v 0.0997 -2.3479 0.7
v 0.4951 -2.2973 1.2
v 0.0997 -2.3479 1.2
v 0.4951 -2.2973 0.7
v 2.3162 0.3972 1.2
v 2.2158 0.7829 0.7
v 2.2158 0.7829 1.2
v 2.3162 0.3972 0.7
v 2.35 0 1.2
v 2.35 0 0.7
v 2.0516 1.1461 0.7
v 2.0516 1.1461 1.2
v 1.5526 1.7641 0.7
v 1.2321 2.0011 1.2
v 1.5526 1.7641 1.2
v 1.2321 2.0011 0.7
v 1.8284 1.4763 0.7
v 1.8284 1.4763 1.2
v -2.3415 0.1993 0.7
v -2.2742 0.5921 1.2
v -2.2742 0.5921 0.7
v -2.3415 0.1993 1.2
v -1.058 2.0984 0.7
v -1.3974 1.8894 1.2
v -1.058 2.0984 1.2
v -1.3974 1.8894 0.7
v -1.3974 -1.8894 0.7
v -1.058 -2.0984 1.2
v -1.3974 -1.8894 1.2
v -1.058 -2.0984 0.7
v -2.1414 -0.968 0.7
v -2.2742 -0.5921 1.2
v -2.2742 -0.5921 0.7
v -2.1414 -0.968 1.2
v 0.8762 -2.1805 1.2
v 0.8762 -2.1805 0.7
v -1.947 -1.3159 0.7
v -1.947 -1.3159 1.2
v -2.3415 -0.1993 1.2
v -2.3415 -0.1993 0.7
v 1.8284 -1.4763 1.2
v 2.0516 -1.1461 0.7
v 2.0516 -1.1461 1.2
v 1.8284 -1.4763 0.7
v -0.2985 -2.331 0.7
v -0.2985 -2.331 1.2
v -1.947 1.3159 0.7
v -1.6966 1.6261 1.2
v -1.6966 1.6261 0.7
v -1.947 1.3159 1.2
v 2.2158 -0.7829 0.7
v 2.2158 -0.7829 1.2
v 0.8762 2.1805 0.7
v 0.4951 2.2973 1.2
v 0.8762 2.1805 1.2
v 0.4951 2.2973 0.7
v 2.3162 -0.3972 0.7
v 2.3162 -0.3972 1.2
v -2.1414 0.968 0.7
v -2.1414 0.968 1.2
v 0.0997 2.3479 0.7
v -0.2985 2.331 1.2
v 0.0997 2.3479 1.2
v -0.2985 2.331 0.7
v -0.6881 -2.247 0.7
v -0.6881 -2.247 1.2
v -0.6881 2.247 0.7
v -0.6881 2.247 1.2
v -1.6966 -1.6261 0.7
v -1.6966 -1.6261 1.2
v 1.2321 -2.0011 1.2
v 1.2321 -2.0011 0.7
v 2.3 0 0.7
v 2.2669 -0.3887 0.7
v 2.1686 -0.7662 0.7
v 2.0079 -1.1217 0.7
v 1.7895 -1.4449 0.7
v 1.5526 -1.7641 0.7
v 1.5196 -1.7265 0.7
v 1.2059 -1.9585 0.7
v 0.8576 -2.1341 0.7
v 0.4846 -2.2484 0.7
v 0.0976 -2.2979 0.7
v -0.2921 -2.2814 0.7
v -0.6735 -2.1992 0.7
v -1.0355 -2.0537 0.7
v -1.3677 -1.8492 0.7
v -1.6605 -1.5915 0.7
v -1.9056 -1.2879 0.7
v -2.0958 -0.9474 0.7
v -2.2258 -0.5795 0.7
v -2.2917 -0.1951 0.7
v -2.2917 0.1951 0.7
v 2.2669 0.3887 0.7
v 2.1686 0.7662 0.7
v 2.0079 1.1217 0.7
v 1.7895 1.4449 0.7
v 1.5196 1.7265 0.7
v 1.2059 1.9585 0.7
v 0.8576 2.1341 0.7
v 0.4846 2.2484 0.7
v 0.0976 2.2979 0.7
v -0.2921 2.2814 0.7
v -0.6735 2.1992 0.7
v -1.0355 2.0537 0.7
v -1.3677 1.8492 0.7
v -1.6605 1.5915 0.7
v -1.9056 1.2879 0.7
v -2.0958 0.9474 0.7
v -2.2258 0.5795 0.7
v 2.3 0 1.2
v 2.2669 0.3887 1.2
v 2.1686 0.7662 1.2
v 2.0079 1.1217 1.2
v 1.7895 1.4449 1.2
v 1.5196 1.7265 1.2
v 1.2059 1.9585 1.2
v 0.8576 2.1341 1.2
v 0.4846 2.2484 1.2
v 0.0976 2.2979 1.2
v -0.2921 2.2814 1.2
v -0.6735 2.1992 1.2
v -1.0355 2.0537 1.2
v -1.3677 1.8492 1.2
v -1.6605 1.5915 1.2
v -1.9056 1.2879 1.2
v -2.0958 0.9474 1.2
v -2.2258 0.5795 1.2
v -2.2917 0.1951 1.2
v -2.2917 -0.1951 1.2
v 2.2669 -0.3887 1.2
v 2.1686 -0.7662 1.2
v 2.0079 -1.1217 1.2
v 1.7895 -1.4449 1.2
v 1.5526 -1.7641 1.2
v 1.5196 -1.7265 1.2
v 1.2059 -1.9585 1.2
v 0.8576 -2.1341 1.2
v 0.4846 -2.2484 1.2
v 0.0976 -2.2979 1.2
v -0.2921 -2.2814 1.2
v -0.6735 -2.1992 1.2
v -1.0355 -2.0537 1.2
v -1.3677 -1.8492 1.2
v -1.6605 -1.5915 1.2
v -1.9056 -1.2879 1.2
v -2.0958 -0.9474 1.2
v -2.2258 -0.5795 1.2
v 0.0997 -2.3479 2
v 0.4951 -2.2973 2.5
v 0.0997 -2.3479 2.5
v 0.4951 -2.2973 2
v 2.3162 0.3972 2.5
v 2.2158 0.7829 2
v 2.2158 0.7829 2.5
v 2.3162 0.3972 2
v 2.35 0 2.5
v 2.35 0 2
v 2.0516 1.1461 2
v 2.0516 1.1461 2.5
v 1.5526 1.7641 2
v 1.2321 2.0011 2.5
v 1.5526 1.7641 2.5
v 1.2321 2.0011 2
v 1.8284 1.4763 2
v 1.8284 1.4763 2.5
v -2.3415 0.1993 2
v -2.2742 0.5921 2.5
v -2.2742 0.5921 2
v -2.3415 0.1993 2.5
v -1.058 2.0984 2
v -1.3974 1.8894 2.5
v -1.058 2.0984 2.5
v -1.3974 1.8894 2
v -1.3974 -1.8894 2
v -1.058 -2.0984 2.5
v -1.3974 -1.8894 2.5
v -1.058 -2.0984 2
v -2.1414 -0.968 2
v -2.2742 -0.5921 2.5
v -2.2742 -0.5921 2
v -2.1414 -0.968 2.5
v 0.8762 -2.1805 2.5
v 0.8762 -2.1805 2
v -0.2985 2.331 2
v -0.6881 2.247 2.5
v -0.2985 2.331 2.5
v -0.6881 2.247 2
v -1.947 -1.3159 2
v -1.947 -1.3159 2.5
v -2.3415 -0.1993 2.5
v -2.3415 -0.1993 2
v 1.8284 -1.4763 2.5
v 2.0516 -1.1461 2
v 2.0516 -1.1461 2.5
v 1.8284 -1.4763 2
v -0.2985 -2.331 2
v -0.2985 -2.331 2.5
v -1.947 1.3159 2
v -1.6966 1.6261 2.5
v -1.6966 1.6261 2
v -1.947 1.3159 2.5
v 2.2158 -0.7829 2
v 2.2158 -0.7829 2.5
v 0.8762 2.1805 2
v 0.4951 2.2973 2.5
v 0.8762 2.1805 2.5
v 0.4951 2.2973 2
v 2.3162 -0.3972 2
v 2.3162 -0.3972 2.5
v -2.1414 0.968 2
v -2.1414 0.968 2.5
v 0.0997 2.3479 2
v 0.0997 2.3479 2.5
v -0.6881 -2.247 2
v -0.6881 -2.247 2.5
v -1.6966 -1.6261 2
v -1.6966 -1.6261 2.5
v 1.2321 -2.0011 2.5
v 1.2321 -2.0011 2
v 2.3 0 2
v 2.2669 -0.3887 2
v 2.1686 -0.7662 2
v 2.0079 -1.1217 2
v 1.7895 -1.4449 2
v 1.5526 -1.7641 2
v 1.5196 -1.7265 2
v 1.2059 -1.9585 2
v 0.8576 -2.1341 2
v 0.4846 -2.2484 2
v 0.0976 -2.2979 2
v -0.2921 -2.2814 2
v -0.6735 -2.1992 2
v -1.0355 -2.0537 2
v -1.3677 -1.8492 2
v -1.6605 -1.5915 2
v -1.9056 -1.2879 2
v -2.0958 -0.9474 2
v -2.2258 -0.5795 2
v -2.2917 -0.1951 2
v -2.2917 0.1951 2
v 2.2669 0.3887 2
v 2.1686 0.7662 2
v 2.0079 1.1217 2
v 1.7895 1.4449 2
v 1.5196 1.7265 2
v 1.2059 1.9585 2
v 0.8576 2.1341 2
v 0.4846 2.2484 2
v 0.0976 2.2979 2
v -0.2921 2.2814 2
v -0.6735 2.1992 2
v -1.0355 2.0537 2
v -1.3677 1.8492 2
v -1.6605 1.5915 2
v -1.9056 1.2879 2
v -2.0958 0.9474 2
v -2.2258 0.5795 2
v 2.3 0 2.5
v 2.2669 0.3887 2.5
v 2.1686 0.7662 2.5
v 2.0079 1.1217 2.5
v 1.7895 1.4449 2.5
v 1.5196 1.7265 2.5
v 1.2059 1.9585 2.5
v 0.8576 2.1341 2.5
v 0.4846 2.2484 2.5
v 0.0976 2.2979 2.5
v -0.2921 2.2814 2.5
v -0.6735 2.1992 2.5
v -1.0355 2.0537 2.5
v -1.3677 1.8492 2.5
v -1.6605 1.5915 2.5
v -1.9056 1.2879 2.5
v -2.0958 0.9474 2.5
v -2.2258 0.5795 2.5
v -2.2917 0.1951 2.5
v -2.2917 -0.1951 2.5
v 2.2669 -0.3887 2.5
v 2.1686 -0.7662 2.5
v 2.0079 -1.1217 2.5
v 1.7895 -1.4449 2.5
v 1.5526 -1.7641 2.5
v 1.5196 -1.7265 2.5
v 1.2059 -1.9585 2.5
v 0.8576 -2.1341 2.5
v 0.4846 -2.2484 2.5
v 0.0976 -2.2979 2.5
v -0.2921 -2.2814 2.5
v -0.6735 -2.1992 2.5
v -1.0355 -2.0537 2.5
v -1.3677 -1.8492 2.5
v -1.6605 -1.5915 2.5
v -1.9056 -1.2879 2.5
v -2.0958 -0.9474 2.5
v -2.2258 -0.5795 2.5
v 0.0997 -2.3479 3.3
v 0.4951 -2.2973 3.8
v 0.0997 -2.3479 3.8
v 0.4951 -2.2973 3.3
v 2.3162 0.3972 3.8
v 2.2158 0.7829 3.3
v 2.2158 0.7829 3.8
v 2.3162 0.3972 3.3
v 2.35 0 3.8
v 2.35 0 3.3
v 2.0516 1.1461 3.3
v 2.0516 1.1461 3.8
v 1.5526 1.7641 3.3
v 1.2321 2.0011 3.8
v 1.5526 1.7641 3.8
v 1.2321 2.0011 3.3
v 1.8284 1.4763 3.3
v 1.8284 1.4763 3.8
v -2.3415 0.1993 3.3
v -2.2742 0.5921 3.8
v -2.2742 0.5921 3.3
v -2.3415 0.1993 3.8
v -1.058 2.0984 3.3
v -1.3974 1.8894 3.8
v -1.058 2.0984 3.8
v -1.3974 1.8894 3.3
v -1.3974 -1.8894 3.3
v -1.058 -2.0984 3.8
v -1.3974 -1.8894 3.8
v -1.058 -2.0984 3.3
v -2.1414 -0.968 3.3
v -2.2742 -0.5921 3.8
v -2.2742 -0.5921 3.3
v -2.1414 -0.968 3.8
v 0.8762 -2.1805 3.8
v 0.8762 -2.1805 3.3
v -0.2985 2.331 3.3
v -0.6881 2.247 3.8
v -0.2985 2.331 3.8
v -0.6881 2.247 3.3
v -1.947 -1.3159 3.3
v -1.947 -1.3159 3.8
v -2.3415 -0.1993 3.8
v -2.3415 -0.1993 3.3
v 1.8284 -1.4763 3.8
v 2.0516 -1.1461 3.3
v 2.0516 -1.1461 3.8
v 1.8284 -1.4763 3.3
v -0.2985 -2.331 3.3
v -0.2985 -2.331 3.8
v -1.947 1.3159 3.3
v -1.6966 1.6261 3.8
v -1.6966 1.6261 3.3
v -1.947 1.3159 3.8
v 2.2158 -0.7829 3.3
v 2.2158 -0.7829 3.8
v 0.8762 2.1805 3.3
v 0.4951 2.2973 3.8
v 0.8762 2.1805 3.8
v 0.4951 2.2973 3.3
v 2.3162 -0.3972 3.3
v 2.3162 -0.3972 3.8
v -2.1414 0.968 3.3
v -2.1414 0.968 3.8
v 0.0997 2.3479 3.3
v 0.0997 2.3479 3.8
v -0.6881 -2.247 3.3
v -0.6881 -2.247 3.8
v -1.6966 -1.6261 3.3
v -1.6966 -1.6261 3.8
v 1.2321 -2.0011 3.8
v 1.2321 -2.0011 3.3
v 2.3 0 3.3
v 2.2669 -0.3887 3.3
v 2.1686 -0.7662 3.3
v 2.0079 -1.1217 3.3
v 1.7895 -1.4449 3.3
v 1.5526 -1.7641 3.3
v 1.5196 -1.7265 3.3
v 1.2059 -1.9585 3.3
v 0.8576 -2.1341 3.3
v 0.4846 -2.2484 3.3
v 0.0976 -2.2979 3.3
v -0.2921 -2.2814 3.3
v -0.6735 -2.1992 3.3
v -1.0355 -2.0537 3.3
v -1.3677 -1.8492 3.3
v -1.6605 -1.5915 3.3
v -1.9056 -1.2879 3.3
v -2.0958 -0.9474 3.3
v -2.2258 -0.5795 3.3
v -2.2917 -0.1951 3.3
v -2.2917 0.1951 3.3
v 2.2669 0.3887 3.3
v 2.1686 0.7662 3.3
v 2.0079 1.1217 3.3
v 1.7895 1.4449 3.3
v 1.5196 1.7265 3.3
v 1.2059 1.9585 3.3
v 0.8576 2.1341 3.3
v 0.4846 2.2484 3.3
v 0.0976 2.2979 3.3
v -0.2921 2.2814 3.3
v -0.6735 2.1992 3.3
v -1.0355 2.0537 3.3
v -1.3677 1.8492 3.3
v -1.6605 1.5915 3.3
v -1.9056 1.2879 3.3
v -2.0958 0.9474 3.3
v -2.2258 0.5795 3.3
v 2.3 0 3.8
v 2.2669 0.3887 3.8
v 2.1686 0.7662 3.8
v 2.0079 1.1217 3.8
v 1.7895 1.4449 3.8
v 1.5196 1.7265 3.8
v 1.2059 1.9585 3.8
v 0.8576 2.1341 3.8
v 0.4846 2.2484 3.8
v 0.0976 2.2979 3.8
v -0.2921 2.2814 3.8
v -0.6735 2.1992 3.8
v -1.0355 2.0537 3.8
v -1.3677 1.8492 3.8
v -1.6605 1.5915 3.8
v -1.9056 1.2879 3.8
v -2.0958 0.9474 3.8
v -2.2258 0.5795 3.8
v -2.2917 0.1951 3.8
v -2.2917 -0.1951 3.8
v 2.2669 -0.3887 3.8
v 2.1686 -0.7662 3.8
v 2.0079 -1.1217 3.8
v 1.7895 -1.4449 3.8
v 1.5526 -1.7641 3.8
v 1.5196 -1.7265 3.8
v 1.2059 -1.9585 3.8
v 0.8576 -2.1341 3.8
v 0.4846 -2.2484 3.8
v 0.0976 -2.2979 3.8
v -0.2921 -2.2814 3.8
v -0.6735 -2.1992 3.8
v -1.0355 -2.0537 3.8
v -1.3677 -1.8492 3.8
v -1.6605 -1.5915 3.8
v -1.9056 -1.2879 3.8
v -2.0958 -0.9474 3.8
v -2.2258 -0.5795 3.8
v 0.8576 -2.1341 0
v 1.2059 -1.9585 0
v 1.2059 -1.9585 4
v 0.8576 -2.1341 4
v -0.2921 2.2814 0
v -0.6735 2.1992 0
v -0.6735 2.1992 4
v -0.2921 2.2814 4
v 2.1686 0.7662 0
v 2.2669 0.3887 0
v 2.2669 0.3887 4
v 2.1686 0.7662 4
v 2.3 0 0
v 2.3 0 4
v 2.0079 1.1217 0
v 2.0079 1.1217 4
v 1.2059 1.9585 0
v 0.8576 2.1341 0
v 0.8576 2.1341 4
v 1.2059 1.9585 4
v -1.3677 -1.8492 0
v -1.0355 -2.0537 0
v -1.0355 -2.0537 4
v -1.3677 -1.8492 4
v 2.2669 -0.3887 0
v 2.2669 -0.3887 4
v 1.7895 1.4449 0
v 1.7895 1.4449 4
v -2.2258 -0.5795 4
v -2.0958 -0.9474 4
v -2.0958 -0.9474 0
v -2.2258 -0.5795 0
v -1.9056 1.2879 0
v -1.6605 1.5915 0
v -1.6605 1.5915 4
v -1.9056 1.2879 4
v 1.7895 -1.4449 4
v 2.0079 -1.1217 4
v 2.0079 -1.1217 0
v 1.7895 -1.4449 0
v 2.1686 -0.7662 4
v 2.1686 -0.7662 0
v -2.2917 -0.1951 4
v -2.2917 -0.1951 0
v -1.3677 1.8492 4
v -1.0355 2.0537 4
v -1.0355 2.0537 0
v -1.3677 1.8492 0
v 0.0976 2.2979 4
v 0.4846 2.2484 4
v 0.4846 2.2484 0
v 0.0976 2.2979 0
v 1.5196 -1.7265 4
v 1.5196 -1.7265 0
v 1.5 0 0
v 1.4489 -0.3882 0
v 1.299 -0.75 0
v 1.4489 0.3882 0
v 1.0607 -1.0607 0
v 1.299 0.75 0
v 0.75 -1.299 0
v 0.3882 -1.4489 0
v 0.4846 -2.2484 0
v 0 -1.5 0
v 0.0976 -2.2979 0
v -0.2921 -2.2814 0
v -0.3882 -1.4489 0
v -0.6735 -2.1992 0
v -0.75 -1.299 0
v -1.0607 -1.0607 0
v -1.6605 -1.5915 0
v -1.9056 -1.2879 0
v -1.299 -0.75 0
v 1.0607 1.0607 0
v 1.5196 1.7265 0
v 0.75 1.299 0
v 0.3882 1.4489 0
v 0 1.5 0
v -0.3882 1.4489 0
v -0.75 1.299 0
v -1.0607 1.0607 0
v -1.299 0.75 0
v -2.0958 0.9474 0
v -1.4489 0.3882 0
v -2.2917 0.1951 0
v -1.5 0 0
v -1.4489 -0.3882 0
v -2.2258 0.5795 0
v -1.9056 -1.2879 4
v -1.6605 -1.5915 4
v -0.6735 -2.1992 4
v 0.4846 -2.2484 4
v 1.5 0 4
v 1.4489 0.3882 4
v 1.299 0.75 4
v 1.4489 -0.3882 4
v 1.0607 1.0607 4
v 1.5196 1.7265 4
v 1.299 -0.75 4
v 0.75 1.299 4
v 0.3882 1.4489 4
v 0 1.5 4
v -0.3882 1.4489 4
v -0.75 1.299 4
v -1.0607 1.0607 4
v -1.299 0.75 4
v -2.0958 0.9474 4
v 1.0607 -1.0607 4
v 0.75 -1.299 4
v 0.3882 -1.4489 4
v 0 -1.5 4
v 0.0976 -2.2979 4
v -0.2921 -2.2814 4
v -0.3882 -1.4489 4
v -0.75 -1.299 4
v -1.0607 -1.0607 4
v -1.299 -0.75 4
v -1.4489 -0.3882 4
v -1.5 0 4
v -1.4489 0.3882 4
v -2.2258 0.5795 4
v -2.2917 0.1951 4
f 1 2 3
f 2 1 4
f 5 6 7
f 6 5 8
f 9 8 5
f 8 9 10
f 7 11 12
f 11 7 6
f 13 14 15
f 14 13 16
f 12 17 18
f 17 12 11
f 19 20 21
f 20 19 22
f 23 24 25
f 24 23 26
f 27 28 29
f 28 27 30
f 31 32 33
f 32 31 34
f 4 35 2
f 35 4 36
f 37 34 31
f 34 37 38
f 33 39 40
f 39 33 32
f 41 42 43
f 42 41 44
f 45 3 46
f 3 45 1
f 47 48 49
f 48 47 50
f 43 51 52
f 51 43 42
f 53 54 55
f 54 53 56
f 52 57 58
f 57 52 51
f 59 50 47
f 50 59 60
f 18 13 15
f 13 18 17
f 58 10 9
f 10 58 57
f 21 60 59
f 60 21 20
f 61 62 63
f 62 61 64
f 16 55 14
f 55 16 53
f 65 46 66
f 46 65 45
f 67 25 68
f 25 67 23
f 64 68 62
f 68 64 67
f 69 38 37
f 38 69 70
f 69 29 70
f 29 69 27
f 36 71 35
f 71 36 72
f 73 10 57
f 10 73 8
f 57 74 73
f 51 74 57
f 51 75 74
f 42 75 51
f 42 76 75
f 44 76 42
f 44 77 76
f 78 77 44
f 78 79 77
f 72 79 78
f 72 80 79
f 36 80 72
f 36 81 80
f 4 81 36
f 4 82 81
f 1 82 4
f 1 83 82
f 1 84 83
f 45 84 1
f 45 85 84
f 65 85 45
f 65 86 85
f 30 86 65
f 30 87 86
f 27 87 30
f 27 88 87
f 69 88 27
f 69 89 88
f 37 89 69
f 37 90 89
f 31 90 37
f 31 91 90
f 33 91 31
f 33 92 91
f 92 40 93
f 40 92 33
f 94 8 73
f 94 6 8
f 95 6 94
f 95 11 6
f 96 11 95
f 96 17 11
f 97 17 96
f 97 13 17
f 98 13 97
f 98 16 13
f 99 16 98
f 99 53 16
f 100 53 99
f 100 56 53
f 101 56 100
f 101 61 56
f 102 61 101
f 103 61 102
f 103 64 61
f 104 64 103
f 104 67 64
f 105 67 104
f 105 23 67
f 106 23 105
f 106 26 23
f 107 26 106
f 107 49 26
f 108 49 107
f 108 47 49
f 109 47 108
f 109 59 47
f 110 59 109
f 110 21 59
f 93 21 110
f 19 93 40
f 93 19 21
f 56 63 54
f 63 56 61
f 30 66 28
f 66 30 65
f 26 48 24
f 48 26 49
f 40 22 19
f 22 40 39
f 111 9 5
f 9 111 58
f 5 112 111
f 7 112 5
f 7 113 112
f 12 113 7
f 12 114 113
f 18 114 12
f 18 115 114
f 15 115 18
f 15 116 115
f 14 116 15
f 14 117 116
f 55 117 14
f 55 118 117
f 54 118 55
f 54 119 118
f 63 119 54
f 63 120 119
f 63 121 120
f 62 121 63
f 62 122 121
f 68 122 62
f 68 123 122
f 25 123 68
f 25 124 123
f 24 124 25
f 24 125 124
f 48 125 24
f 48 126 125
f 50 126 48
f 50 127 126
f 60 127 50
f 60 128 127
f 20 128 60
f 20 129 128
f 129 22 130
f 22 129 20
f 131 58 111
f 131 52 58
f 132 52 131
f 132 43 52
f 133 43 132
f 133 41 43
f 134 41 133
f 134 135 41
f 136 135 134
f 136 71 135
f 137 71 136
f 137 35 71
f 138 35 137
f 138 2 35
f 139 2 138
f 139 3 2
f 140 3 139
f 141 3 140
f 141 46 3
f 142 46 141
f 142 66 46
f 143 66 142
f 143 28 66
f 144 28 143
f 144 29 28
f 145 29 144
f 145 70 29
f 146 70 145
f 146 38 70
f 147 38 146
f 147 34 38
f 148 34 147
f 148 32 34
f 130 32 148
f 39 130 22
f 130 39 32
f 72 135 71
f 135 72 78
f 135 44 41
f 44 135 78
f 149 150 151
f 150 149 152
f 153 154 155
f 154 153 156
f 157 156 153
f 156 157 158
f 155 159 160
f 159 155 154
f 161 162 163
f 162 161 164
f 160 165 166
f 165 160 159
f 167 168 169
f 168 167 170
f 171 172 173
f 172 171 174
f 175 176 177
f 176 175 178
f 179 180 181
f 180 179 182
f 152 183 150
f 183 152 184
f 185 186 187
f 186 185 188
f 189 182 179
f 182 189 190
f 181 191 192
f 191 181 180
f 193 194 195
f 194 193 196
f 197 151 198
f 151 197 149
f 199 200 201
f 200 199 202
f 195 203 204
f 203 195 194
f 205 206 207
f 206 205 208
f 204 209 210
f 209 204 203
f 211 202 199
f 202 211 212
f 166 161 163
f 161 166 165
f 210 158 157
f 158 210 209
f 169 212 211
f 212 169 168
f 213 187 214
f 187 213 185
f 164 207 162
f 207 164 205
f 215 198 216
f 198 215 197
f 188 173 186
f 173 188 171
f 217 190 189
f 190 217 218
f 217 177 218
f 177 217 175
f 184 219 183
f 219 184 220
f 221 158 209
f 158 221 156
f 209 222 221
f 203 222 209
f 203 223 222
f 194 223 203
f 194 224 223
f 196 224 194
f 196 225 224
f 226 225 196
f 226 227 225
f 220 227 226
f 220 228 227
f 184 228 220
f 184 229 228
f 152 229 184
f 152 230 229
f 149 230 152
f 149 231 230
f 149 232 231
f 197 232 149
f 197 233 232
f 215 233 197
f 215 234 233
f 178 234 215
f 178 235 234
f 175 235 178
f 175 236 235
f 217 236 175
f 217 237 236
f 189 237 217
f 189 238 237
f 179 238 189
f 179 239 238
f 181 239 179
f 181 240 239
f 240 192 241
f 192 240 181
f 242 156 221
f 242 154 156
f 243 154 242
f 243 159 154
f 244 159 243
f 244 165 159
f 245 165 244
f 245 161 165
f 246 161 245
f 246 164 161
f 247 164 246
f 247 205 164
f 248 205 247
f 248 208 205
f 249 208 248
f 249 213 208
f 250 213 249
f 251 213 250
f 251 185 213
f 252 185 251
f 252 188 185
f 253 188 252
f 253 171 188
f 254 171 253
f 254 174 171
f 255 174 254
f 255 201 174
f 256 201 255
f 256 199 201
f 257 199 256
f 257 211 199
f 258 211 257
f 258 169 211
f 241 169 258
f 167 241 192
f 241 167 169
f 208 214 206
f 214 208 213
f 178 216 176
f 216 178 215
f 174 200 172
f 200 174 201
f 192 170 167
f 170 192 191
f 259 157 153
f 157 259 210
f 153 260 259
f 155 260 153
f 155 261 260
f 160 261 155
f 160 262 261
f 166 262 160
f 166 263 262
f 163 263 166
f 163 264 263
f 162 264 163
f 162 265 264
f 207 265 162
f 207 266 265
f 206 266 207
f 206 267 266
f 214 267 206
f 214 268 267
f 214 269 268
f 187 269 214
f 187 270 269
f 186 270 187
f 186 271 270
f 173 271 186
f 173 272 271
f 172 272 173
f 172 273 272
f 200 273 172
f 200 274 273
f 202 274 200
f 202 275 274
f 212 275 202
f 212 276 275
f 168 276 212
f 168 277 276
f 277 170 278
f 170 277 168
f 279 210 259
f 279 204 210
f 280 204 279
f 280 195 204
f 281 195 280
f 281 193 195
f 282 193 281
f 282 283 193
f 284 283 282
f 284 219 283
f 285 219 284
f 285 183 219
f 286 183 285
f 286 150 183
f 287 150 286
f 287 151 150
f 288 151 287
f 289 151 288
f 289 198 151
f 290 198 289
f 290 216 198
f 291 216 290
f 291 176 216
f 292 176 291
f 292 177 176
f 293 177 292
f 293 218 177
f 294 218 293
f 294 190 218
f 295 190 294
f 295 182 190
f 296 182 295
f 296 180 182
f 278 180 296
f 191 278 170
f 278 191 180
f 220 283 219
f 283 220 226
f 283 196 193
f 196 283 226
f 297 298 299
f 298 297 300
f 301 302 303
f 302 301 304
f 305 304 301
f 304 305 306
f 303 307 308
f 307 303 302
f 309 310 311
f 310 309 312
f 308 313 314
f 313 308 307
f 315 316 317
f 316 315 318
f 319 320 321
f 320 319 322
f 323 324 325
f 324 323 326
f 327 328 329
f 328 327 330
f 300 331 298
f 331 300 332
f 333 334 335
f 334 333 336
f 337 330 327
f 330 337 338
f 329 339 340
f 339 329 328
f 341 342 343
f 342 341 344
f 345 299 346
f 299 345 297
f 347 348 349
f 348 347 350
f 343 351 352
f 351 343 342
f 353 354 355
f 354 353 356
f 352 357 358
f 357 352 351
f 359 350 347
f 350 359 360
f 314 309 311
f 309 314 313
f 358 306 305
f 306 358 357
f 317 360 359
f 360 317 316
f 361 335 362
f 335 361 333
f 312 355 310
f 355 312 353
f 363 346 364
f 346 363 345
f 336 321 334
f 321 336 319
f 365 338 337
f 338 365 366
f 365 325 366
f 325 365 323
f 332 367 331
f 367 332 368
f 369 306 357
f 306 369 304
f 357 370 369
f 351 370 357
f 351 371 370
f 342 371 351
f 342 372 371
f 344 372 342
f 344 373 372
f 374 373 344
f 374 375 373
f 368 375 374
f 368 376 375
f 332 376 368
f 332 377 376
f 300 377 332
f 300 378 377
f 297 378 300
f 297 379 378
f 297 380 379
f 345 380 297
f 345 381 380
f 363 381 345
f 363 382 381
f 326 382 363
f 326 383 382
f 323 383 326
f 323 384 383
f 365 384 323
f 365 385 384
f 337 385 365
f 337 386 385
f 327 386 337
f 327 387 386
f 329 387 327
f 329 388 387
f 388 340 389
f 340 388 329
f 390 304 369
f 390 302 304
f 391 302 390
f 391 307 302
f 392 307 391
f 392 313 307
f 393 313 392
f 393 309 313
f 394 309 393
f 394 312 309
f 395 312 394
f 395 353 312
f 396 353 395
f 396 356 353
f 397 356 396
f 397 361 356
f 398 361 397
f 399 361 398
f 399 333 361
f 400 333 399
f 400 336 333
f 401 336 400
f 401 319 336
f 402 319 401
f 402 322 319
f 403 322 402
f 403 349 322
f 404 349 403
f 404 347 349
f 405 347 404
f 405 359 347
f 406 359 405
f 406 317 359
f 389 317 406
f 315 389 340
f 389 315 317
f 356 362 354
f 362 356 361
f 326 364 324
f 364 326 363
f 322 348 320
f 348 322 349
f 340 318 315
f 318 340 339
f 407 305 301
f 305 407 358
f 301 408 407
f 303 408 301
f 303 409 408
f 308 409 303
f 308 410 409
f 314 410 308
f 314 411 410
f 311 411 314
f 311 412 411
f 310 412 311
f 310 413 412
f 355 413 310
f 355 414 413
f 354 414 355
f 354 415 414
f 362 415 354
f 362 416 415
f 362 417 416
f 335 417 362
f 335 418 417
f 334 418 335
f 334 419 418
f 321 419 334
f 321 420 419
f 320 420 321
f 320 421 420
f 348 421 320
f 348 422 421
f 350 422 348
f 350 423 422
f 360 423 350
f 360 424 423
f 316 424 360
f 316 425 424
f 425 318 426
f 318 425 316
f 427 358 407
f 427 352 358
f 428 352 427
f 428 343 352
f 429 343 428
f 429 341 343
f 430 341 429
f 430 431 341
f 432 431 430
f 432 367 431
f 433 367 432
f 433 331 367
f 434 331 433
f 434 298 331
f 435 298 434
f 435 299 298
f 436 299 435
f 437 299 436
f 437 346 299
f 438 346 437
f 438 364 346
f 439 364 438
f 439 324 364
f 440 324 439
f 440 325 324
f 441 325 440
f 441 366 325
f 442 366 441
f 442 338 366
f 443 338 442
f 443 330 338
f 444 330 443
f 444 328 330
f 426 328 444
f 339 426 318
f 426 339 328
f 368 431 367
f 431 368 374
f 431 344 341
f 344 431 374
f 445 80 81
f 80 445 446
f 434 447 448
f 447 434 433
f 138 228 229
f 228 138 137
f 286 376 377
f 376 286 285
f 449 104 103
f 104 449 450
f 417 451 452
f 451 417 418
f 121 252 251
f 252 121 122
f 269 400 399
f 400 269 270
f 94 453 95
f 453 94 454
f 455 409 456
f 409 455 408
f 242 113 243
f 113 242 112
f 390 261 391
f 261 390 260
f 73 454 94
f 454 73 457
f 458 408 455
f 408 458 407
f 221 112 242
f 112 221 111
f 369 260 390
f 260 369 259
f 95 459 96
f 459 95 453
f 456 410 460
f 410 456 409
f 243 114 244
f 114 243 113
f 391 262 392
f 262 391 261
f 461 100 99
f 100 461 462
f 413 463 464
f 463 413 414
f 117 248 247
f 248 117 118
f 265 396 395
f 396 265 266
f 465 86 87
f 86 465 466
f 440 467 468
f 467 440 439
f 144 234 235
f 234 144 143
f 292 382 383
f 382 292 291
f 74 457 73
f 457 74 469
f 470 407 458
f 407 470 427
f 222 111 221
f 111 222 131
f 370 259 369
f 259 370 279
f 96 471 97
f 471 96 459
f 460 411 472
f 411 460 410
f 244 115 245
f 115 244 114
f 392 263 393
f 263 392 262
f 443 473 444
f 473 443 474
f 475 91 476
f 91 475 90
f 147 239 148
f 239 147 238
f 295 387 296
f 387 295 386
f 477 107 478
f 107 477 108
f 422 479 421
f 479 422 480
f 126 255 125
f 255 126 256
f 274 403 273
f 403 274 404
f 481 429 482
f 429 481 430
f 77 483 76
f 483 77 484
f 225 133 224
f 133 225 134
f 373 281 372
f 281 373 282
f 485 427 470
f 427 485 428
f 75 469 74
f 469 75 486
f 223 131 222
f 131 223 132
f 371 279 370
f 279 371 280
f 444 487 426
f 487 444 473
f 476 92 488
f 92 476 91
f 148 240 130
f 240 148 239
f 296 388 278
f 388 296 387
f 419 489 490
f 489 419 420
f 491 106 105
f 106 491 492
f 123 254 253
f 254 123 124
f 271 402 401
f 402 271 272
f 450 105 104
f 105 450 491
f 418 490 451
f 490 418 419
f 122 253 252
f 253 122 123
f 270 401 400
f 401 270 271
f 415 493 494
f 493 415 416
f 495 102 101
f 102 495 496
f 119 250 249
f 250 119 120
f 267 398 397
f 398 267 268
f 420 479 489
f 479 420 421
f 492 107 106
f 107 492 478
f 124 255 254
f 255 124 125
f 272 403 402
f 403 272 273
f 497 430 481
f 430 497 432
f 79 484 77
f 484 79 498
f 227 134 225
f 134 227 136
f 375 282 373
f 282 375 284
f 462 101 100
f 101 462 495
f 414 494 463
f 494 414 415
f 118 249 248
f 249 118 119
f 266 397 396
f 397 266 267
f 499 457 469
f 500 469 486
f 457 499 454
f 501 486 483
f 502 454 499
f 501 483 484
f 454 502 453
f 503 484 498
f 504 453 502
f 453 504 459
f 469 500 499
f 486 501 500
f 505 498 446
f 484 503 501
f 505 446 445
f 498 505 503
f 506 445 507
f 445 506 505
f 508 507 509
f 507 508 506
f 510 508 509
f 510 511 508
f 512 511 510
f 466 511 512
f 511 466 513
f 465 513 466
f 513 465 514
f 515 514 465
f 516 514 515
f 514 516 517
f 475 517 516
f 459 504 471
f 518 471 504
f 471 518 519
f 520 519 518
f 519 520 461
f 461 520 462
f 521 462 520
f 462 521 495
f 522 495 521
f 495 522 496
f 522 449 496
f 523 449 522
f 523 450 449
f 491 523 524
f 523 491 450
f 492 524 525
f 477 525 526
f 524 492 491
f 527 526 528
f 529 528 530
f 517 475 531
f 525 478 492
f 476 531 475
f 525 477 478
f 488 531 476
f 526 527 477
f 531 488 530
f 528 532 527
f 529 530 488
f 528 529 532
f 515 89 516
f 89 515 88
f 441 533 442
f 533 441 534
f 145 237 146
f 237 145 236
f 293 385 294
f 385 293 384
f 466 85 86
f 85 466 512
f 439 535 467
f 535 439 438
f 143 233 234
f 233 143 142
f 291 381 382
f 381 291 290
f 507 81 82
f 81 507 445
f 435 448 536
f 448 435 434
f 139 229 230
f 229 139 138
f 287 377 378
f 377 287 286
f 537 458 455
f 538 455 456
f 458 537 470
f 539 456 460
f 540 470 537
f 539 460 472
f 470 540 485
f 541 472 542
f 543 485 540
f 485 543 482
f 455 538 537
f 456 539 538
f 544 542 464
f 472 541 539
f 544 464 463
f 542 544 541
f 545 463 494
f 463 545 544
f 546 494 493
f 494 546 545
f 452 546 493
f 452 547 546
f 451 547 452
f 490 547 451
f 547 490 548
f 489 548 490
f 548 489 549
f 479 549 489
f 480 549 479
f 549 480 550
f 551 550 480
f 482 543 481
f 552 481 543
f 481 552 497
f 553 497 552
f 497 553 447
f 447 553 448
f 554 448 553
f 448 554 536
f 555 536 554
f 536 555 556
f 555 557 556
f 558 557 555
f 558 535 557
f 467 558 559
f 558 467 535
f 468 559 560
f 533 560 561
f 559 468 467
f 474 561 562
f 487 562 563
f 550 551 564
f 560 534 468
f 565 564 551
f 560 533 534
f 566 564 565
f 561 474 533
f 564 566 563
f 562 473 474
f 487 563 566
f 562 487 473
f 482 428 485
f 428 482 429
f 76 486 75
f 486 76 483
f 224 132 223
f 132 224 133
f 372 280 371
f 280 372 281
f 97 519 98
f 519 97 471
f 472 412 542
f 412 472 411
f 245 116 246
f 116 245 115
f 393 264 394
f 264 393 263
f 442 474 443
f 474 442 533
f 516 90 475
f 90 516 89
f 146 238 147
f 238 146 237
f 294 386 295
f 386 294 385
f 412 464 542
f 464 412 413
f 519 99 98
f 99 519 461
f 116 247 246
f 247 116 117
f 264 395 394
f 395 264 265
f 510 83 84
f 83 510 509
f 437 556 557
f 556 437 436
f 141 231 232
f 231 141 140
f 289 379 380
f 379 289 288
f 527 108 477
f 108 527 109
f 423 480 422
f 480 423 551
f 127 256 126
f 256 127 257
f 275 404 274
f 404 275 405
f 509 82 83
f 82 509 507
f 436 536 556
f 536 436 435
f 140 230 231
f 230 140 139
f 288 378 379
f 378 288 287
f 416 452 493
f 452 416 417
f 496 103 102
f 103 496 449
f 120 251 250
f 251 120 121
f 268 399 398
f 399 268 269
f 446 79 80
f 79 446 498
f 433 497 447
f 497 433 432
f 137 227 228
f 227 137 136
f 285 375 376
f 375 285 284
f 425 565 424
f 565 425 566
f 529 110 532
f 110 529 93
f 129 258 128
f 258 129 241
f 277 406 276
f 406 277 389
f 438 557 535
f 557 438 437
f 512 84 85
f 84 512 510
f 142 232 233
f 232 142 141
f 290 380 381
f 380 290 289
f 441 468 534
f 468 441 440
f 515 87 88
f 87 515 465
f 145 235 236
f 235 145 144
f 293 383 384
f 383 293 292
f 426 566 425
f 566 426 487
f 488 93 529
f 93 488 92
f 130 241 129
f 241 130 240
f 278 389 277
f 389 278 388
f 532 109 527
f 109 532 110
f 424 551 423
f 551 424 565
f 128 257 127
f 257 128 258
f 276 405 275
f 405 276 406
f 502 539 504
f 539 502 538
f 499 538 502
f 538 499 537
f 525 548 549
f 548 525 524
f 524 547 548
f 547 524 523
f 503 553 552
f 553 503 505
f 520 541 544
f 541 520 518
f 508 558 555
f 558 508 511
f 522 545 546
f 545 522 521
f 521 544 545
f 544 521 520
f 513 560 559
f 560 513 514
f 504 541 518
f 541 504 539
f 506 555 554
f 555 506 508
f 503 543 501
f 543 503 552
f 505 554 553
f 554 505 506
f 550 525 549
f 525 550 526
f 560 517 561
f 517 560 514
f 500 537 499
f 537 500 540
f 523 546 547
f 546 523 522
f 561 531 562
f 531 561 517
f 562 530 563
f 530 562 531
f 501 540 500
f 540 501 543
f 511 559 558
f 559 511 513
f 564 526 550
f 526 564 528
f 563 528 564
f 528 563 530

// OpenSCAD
$fa = 2;
$fs = 0.4;

module heat_insert() {
  color("#c4a35a")
    difference() {
      union() {
        cylinder(h = 4, d = 4.6);
        for (z = [0.7, 2.0, 3.3])
          translate([0, 0, z])
            cylinder(h = 0.5, d = 4.7);
      }
      translate([0, 0, -0.5])
        cylinder(h = 5, d = 3);
    }
}

heat_insert();
